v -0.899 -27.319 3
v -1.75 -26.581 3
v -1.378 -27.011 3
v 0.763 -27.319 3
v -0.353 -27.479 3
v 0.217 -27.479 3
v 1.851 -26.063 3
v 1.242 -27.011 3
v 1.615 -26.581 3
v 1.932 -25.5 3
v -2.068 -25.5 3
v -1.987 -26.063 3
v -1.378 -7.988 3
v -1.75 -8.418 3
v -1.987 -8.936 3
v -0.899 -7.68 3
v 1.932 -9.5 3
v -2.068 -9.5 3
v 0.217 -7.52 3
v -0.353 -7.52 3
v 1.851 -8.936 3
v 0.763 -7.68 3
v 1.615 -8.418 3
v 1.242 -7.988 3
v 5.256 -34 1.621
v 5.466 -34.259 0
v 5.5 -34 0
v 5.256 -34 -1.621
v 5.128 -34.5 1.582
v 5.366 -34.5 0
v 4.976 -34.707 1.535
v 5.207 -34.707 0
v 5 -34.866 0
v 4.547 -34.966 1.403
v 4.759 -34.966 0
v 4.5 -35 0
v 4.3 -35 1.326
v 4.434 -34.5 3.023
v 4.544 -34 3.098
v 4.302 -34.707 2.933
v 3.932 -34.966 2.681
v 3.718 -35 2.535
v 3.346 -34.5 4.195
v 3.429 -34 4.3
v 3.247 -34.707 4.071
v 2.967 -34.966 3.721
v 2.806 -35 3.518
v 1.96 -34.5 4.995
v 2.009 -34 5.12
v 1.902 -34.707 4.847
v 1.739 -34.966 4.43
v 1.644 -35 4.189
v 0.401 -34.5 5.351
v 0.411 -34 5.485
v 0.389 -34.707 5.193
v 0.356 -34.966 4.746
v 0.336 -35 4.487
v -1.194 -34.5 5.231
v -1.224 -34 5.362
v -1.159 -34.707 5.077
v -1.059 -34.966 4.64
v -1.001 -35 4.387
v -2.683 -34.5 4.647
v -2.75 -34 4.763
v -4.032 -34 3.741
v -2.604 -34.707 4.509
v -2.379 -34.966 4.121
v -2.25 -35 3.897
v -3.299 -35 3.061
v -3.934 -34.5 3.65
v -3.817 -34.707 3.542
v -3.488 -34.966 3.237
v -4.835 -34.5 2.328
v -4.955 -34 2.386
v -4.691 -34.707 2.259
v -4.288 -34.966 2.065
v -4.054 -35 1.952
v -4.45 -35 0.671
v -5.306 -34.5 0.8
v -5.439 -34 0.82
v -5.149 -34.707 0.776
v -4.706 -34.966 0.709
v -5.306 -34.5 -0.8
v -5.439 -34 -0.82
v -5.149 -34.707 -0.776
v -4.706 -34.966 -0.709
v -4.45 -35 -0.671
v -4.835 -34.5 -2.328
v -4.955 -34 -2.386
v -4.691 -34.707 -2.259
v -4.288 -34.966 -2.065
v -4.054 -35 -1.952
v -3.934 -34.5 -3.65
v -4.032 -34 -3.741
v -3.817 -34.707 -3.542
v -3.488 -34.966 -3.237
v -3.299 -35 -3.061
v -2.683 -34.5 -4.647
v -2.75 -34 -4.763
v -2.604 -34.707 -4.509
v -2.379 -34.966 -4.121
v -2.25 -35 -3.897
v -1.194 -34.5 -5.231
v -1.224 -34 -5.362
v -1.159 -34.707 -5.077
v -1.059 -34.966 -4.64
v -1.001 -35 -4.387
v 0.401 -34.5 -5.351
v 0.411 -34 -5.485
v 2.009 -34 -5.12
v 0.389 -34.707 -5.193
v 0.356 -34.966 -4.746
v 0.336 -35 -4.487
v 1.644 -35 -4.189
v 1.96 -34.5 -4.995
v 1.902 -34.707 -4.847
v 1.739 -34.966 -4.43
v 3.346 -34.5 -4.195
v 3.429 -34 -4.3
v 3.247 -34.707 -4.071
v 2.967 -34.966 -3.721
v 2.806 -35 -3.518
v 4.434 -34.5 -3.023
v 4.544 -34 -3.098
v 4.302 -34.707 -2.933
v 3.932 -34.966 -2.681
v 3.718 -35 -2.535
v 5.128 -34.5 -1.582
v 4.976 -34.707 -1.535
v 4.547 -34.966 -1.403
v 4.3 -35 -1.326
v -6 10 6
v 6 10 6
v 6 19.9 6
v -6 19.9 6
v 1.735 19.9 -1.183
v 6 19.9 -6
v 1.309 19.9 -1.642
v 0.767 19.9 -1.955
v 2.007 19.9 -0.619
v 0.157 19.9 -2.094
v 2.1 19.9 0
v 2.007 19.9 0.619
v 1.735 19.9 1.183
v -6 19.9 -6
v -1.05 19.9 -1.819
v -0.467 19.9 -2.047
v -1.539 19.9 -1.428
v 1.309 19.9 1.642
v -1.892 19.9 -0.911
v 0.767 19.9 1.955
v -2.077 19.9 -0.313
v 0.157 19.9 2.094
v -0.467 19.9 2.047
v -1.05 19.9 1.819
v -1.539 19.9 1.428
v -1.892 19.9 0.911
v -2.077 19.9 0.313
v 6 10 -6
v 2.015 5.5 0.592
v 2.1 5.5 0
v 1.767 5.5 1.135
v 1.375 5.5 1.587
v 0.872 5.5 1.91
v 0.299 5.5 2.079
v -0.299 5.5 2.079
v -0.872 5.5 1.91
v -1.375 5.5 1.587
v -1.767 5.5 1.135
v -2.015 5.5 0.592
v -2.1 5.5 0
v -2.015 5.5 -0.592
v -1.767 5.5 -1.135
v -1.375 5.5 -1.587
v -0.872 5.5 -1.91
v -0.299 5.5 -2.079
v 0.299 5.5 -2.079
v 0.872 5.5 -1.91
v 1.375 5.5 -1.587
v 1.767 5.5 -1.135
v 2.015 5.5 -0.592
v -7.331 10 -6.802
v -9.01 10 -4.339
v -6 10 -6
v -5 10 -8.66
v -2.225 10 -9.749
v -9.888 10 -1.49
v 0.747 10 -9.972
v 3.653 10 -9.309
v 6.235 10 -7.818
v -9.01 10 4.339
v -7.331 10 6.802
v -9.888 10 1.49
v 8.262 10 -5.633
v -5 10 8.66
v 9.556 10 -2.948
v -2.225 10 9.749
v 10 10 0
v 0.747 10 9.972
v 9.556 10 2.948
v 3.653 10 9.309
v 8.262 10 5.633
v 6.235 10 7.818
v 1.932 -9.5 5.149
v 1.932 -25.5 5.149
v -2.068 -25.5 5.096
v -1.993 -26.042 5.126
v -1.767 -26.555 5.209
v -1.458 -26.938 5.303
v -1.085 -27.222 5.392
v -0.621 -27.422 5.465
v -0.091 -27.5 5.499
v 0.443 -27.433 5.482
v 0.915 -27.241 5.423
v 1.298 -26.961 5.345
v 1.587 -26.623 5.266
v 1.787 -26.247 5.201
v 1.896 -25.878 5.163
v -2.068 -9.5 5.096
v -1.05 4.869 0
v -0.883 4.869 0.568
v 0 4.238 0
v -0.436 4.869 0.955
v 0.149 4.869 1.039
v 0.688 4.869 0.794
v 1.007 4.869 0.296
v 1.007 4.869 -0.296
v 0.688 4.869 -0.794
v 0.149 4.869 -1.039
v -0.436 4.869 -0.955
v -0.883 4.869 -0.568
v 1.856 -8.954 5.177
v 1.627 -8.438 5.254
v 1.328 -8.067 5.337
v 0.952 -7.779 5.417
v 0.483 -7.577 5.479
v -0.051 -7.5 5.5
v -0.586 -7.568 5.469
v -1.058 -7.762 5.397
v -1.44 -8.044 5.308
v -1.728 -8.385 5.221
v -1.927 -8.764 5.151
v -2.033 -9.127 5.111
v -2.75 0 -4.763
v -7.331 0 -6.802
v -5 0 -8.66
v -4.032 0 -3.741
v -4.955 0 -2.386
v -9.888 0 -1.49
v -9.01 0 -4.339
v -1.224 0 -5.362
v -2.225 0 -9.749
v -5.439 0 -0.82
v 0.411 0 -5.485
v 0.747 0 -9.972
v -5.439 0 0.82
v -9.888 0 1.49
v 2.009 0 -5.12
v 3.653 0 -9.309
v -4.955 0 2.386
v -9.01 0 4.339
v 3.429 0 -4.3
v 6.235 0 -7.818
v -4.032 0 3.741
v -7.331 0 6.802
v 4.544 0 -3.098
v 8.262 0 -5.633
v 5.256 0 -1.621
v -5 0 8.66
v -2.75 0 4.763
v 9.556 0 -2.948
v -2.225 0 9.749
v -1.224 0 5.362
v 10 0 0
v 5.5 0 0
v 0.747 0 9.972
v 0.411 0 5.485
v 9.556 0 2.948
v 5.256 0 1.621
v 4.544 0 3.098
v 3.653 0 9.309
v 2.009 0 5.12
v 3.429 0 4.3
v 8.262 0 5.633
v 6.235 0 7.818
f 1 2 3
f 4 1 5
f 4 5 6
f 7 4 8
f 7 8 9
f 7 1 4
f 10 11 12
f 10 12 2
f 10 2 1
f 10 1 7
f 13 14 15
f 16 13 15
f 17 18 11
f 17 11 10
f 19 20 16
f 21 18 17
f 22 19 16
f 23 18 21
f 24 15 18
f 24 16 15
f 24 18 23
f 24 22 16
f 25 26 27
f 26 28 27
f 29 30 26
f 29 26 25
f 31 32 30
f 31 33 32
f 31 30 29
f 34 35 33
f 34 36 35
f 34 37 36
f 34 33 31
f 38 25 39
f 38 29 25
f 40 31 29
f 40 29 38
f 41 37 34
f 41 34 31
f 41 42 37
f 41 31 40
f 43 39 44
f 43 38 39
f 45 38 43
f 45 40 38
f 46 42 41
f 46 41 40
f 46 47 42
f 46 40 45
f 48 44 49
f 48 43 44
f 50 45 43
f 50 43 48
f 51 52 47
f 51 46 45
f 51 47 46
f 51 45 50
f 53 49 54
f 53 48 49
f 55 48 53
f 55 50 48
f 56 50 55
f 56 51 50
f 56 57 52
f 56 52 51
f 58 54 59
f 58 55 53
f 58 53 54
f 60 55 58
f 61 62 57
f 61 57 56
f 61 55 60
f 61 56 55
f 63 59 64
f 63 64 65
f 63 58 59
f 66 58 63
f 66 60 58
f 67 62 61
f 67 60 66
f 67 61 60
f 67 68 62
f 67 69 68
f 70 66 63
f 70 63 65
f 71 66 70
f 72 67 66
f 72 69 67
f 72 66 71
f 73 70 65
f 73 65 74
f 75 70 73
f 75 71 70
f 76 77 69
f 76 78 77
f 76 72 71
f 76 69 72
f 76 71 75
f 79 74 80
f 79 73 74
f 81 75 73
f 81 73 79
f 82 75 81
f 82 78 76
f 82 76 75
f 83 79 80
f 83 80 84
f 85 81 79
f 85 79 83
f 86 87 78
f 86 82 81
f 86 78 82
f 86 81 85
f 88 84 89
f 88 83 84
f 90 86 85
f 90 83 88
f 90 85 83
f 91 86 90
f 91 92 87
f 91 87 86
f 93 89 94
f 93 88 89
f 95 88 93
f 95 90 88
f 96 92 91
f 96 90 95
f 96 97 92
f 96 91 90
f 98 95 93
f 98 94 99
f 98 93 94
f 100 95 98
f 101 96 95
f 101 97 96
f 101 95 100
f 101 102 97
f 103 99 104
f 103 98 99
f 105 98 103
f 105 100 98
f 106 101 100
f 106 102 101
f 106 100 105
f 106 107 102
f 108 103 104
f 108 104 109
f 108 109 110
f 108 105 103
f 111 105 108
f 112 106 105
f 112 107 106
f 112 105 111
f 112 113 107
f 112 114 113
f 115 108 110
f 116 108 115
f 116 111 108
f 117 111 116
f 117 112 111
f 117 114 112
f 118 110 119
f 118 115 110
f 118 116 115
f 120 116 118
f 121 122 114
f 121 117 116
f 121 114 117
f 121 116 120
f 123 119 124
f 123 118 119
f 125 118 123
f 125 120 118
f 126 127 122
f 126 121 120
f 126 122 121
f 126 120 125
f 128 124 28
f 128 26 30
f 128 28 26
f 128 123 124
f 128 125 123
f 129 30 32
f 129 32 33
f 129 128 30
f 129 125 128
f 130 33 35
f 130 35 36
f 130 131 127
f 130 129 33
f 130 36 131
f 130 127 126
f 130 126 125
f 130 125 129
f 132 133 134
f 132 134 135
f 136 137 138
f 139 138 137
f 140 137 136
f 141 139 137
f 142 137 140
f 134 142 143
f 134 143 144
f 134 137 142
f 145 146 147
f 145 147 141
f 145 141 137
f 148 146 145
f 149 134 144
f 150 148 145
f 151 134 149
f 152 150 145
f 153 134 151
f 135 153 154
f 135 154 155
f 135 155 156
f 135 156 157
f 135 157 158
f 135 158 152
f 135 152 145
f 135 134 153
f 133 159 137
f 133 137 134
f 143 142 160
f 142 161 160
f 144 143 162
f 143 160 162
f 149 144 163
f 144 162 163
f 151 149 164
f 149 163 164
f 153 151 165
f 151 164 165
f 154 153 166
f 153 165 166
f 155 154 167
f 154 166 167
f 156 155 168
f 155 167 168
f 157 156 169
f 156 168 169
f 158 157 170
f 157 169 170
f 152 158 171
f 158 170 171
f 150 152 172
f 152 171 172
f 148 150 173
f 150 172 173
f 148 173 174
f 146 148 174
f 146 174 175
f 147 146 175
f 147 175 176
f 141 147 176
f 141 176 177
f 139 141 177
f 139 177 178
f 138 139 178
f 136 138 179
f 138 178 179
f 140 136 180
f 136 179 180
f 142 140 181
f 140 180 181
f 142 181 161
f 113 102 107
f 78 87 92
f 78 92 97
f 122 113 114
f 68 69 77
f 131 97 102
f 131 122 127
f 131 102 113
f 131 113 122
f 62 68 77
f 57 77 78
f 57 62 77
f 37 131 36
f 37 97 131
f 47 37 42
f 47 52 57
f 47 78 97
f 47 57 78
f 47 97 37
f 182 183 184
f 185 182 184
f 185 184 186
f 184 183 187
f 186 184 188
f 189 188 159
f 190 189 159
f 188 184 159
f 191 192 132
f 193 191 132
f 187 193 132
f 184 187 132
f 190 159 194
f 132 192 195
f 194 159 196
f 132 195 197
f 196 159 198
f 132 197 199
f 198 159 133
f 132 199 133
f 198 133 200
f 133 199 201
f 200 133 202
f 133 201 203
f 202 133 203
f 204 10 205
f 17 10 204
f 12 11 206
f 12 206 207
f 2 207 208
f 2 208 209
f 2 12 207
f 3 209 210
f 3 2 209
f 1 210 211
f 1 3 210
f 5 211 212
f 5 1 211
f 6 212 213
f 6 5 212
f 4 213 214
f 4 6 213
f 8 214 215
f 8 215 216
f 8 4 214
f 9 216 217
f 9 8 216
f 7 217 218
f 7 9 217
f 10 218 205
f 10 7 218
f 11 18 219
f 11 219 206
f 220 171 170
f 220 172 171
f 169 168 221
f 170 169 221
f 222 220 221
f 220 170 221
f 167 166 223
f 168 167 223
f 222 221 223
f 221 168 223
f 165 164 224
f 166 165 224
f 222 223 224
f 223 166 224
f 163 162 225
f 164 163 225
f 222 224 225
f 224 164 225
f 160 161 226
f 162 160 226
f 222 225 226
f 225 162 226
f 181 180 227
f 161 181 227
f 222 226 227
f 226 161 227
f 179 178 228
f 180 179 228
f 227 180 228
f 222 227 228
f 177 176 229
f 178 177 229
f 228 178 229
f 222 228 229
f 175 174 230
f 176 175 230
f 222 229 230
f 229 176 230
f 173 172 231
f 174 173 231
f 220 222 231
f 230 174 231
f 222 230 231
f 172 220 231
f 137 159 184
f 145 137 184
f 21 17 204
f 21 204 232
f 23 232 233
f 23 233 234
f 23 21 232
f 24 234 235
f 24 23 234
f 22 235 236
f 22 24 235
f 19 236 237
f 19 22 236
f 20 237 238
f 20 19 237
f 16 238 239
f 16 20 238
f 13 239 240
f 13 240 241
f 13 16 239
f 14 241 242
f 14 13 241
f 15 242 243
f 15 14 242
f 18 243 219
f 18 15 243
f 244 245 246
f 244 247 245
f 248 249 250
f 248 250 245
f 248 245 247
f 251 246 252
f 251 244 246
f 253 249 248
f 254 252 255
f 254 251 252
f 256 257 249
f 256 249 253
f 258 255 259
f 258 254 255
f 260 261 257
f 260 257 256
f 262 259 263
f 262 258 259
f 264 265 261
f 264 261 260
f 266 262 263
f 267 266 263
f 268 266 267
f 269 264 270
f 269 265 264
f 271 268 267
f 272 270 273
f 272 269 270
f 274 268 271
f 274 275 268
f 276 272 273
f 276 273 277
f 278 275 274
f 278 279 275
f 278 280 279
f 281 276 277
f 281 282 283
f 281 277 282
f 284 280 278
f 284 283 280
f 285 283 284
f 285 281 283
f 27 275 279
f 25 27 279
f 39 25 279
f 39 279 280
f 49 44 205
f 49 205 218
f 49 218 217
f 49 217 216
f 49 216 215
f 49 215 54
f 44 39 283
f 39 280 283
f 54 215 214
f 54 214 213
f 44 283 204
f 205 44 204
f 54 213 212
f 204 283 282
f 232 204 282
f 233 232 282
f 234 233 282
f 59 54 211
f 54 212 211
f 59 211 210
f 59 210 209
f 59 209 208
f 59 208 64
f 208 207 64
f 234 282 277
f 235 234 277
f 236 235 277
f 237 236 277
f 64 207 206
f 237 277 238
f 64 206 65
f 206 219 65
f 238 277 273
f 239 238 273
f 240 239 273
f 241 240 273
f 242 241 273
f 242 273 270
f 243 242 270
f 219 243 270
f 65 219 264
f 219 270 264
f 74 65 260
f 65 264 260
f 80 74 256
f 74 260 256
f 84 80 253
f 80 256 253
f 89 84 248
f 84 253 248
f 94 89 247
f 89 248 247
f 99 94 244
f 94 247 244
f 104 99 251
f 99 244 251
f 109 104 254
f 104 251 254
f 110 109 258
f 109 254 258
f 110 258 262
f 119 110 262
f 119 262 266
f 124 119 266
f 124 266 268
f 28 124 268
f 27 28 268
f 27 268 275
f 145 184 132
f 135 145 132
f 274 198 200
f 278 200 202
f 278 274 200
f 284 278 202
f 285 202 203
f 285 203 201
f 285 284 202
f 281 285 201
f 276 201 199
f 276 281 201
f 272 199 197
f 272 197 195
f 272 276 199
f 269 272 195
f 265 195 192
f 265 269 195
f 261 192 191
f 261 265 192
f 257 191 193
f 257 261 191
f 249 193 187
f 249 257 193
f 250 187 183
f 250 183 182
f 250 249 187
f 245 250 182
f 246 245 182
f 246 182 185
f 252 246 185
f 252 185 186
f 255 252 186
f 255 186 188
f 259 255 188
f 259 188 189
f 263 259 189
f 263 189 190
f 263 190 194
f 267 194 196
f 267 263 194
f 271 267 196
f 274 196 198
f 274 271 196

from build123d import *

# Parameters (mm, degrees)
F0_R      = 5.5
F1_DEPTH  = 35
F2_R      = 10
F3_DEPTH  = 10
F4_W      = 12
F4_H      = 12
F5_DEPTH  = 9.9
F7_D      = 4.2
F7_DEPTH  = 14.4
F7_TIP    = 1.2618073
F10_DEPTH = 25
F11_R     = 1


with BuildPart() as f1:
    # F0 (on Front) → F1 (new body)
    with BuildSketch(Plane.XZ):
        Circle(F0_R)
    extrude(amount=F1_DEPTH)

    # F2 (on Front) → F3 (join)
    with BuildSketch(Plane.XZ):
        Circle(F2_R)
    extrude(amount=-F3_DEPTH)

    # F4 (on face) → F5 (join)
    with BuildSketch(Plane(origin=(0, 10, 0), x_dir=(-1, 0, 0), z_dir=(0, 1, 0))):
        Rectangle(F4_W, F4_H)
    extrude(amount=F5_DEPTH)

    # F7
    with Locations(Plane(origin=(0, 19.9, 0), x_dir=(-1, 0, 0), z_dir=(0, 1, 0))):
        with Locations((0, 0)):
            Hole(F7_D / 2, depth=F7_DEPTH)
            with Locations((0, 0, -(F7_DEPTH + F7_TIP / 2))):  # 118° drill point
                Cone(0, F7_D / 2, F7_TIP, mode=Mode.SUBTRACT)

    # F9 (on offset) → F10 (cut)
    with BuildSketch(Plane.XY.offset(3)):
        with BuildLine():
            ThreePointArc((1.9320917986, -9.4997572851), (-0.0679082014, -7.4997572851), (-2.0679082014, -9.4997572851))
            Line((-2.0679082014, -9.4997572851), (-2.0679082014, -25.4997572851))
            ThreePointArc((-2.0679082014, -25.4997572851), (-0.0679082014, -27.4997572851), (1.9320917986, -25.4997572851))
            Line((1.9320917986, -25.4997572851), (1.9320917986, -9.4997572851))
        make_face()
    extrude(amount=F10_DEPTH, mode=Mode.SUBTRACT)

    # F11
    f11_edges = [f1.edges().sort_by_distance(p)[0] for p in [
        (-5.5, -35, 0),
    ]]
    fillet(f11_edges, radius=F11_R)


solid = f1.part
